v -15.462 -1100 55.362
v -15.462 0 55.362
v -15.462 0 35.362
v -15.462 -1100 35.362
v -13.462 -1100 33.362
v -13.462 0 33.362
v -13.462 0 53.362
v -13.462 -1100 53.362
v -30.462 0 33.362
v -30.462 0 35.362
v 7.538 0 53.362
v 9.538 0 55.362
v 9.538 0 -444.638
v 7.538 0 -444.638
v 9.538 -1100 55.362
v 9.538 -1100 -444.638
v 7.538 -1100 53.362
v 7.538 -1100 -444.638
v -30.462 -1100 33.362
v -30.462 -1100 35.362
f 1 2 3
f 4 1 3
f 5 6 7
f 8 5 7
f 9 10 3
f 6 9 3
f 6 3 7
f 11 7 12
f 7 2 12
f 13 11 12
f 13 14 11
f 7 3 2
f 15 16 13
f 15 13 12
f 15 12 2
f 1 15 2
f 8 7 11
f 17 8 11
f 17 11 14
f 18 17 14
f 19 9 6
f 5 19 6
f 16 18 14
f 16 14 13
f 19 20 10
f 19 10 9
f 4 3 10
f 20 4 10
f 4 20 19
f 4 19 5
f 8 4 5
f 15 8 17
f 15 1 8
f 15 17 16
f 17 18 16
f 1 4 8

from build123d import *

# Parameters (mm, degrees)
F1_DEPTH = 1100


# Not quite as in the source:
# - a feature names something its author has since deleted; it is built from what else it names


with BuildPart() as f1:
    # F0 (on Front) → F1 (new body)
    with BuildSketch(Plane.XZ):
        Polygon((-15.4624978453, 35.3617481887), (-30.4624978453, 35.3617481887), (-30.4624978453, 33.3617481887), (-13.4624978453, 33.3617481887), (-13.4624978453, 53.3617481887), (7.5375021547, 53.3617481887), (7.5375021547, -444.6382518113), (9.5375021547, -444.6382518113), (9.5375021547, 55.3617481887), (-15.4624978453, 55.3617481887), align=None)
    extrude(amount=F1_DEPTH)


solid = f1.part
